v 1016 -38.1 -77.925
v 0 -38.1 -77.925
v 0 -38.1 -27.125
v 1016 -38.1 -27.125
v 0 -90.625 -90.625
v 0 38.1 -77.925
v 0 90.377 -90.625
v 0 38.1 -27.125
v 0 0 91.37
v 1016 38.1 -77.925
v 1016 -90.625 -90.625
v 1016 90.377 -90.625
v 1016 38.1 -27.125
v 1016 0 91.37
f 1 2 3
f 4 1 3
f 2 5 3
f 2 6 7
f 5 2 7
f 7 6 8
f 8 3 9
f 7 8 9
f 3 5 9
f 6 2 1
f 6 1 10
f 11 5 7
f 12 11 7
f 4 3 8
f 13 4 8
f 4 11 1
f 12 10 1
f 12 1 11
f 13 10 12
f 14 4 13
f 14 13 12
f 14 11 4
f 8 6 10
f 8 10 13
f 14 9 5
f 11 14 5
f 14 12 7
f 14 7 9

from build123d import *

# Parameters (mm, degrees)
F0_W     = 76.2
F0_H     = 50.8
F1_DEPTH = 1016


with BuildPart() as f1:
    # F0 (on Right) → F1 (new body)
    with BuildSketch(Plane.YZ):
        Polygon((0, 91.370057), (-90.625222, -90.625168), (90.376866, -90.625168), align=None)
        with Locations((0, -52.525168)):
            Rectangle(F0_W, F0_H, mode=Mode.SUBTRACT)
    extrude(amount=F1_DEPTH)


solid = f1.part
